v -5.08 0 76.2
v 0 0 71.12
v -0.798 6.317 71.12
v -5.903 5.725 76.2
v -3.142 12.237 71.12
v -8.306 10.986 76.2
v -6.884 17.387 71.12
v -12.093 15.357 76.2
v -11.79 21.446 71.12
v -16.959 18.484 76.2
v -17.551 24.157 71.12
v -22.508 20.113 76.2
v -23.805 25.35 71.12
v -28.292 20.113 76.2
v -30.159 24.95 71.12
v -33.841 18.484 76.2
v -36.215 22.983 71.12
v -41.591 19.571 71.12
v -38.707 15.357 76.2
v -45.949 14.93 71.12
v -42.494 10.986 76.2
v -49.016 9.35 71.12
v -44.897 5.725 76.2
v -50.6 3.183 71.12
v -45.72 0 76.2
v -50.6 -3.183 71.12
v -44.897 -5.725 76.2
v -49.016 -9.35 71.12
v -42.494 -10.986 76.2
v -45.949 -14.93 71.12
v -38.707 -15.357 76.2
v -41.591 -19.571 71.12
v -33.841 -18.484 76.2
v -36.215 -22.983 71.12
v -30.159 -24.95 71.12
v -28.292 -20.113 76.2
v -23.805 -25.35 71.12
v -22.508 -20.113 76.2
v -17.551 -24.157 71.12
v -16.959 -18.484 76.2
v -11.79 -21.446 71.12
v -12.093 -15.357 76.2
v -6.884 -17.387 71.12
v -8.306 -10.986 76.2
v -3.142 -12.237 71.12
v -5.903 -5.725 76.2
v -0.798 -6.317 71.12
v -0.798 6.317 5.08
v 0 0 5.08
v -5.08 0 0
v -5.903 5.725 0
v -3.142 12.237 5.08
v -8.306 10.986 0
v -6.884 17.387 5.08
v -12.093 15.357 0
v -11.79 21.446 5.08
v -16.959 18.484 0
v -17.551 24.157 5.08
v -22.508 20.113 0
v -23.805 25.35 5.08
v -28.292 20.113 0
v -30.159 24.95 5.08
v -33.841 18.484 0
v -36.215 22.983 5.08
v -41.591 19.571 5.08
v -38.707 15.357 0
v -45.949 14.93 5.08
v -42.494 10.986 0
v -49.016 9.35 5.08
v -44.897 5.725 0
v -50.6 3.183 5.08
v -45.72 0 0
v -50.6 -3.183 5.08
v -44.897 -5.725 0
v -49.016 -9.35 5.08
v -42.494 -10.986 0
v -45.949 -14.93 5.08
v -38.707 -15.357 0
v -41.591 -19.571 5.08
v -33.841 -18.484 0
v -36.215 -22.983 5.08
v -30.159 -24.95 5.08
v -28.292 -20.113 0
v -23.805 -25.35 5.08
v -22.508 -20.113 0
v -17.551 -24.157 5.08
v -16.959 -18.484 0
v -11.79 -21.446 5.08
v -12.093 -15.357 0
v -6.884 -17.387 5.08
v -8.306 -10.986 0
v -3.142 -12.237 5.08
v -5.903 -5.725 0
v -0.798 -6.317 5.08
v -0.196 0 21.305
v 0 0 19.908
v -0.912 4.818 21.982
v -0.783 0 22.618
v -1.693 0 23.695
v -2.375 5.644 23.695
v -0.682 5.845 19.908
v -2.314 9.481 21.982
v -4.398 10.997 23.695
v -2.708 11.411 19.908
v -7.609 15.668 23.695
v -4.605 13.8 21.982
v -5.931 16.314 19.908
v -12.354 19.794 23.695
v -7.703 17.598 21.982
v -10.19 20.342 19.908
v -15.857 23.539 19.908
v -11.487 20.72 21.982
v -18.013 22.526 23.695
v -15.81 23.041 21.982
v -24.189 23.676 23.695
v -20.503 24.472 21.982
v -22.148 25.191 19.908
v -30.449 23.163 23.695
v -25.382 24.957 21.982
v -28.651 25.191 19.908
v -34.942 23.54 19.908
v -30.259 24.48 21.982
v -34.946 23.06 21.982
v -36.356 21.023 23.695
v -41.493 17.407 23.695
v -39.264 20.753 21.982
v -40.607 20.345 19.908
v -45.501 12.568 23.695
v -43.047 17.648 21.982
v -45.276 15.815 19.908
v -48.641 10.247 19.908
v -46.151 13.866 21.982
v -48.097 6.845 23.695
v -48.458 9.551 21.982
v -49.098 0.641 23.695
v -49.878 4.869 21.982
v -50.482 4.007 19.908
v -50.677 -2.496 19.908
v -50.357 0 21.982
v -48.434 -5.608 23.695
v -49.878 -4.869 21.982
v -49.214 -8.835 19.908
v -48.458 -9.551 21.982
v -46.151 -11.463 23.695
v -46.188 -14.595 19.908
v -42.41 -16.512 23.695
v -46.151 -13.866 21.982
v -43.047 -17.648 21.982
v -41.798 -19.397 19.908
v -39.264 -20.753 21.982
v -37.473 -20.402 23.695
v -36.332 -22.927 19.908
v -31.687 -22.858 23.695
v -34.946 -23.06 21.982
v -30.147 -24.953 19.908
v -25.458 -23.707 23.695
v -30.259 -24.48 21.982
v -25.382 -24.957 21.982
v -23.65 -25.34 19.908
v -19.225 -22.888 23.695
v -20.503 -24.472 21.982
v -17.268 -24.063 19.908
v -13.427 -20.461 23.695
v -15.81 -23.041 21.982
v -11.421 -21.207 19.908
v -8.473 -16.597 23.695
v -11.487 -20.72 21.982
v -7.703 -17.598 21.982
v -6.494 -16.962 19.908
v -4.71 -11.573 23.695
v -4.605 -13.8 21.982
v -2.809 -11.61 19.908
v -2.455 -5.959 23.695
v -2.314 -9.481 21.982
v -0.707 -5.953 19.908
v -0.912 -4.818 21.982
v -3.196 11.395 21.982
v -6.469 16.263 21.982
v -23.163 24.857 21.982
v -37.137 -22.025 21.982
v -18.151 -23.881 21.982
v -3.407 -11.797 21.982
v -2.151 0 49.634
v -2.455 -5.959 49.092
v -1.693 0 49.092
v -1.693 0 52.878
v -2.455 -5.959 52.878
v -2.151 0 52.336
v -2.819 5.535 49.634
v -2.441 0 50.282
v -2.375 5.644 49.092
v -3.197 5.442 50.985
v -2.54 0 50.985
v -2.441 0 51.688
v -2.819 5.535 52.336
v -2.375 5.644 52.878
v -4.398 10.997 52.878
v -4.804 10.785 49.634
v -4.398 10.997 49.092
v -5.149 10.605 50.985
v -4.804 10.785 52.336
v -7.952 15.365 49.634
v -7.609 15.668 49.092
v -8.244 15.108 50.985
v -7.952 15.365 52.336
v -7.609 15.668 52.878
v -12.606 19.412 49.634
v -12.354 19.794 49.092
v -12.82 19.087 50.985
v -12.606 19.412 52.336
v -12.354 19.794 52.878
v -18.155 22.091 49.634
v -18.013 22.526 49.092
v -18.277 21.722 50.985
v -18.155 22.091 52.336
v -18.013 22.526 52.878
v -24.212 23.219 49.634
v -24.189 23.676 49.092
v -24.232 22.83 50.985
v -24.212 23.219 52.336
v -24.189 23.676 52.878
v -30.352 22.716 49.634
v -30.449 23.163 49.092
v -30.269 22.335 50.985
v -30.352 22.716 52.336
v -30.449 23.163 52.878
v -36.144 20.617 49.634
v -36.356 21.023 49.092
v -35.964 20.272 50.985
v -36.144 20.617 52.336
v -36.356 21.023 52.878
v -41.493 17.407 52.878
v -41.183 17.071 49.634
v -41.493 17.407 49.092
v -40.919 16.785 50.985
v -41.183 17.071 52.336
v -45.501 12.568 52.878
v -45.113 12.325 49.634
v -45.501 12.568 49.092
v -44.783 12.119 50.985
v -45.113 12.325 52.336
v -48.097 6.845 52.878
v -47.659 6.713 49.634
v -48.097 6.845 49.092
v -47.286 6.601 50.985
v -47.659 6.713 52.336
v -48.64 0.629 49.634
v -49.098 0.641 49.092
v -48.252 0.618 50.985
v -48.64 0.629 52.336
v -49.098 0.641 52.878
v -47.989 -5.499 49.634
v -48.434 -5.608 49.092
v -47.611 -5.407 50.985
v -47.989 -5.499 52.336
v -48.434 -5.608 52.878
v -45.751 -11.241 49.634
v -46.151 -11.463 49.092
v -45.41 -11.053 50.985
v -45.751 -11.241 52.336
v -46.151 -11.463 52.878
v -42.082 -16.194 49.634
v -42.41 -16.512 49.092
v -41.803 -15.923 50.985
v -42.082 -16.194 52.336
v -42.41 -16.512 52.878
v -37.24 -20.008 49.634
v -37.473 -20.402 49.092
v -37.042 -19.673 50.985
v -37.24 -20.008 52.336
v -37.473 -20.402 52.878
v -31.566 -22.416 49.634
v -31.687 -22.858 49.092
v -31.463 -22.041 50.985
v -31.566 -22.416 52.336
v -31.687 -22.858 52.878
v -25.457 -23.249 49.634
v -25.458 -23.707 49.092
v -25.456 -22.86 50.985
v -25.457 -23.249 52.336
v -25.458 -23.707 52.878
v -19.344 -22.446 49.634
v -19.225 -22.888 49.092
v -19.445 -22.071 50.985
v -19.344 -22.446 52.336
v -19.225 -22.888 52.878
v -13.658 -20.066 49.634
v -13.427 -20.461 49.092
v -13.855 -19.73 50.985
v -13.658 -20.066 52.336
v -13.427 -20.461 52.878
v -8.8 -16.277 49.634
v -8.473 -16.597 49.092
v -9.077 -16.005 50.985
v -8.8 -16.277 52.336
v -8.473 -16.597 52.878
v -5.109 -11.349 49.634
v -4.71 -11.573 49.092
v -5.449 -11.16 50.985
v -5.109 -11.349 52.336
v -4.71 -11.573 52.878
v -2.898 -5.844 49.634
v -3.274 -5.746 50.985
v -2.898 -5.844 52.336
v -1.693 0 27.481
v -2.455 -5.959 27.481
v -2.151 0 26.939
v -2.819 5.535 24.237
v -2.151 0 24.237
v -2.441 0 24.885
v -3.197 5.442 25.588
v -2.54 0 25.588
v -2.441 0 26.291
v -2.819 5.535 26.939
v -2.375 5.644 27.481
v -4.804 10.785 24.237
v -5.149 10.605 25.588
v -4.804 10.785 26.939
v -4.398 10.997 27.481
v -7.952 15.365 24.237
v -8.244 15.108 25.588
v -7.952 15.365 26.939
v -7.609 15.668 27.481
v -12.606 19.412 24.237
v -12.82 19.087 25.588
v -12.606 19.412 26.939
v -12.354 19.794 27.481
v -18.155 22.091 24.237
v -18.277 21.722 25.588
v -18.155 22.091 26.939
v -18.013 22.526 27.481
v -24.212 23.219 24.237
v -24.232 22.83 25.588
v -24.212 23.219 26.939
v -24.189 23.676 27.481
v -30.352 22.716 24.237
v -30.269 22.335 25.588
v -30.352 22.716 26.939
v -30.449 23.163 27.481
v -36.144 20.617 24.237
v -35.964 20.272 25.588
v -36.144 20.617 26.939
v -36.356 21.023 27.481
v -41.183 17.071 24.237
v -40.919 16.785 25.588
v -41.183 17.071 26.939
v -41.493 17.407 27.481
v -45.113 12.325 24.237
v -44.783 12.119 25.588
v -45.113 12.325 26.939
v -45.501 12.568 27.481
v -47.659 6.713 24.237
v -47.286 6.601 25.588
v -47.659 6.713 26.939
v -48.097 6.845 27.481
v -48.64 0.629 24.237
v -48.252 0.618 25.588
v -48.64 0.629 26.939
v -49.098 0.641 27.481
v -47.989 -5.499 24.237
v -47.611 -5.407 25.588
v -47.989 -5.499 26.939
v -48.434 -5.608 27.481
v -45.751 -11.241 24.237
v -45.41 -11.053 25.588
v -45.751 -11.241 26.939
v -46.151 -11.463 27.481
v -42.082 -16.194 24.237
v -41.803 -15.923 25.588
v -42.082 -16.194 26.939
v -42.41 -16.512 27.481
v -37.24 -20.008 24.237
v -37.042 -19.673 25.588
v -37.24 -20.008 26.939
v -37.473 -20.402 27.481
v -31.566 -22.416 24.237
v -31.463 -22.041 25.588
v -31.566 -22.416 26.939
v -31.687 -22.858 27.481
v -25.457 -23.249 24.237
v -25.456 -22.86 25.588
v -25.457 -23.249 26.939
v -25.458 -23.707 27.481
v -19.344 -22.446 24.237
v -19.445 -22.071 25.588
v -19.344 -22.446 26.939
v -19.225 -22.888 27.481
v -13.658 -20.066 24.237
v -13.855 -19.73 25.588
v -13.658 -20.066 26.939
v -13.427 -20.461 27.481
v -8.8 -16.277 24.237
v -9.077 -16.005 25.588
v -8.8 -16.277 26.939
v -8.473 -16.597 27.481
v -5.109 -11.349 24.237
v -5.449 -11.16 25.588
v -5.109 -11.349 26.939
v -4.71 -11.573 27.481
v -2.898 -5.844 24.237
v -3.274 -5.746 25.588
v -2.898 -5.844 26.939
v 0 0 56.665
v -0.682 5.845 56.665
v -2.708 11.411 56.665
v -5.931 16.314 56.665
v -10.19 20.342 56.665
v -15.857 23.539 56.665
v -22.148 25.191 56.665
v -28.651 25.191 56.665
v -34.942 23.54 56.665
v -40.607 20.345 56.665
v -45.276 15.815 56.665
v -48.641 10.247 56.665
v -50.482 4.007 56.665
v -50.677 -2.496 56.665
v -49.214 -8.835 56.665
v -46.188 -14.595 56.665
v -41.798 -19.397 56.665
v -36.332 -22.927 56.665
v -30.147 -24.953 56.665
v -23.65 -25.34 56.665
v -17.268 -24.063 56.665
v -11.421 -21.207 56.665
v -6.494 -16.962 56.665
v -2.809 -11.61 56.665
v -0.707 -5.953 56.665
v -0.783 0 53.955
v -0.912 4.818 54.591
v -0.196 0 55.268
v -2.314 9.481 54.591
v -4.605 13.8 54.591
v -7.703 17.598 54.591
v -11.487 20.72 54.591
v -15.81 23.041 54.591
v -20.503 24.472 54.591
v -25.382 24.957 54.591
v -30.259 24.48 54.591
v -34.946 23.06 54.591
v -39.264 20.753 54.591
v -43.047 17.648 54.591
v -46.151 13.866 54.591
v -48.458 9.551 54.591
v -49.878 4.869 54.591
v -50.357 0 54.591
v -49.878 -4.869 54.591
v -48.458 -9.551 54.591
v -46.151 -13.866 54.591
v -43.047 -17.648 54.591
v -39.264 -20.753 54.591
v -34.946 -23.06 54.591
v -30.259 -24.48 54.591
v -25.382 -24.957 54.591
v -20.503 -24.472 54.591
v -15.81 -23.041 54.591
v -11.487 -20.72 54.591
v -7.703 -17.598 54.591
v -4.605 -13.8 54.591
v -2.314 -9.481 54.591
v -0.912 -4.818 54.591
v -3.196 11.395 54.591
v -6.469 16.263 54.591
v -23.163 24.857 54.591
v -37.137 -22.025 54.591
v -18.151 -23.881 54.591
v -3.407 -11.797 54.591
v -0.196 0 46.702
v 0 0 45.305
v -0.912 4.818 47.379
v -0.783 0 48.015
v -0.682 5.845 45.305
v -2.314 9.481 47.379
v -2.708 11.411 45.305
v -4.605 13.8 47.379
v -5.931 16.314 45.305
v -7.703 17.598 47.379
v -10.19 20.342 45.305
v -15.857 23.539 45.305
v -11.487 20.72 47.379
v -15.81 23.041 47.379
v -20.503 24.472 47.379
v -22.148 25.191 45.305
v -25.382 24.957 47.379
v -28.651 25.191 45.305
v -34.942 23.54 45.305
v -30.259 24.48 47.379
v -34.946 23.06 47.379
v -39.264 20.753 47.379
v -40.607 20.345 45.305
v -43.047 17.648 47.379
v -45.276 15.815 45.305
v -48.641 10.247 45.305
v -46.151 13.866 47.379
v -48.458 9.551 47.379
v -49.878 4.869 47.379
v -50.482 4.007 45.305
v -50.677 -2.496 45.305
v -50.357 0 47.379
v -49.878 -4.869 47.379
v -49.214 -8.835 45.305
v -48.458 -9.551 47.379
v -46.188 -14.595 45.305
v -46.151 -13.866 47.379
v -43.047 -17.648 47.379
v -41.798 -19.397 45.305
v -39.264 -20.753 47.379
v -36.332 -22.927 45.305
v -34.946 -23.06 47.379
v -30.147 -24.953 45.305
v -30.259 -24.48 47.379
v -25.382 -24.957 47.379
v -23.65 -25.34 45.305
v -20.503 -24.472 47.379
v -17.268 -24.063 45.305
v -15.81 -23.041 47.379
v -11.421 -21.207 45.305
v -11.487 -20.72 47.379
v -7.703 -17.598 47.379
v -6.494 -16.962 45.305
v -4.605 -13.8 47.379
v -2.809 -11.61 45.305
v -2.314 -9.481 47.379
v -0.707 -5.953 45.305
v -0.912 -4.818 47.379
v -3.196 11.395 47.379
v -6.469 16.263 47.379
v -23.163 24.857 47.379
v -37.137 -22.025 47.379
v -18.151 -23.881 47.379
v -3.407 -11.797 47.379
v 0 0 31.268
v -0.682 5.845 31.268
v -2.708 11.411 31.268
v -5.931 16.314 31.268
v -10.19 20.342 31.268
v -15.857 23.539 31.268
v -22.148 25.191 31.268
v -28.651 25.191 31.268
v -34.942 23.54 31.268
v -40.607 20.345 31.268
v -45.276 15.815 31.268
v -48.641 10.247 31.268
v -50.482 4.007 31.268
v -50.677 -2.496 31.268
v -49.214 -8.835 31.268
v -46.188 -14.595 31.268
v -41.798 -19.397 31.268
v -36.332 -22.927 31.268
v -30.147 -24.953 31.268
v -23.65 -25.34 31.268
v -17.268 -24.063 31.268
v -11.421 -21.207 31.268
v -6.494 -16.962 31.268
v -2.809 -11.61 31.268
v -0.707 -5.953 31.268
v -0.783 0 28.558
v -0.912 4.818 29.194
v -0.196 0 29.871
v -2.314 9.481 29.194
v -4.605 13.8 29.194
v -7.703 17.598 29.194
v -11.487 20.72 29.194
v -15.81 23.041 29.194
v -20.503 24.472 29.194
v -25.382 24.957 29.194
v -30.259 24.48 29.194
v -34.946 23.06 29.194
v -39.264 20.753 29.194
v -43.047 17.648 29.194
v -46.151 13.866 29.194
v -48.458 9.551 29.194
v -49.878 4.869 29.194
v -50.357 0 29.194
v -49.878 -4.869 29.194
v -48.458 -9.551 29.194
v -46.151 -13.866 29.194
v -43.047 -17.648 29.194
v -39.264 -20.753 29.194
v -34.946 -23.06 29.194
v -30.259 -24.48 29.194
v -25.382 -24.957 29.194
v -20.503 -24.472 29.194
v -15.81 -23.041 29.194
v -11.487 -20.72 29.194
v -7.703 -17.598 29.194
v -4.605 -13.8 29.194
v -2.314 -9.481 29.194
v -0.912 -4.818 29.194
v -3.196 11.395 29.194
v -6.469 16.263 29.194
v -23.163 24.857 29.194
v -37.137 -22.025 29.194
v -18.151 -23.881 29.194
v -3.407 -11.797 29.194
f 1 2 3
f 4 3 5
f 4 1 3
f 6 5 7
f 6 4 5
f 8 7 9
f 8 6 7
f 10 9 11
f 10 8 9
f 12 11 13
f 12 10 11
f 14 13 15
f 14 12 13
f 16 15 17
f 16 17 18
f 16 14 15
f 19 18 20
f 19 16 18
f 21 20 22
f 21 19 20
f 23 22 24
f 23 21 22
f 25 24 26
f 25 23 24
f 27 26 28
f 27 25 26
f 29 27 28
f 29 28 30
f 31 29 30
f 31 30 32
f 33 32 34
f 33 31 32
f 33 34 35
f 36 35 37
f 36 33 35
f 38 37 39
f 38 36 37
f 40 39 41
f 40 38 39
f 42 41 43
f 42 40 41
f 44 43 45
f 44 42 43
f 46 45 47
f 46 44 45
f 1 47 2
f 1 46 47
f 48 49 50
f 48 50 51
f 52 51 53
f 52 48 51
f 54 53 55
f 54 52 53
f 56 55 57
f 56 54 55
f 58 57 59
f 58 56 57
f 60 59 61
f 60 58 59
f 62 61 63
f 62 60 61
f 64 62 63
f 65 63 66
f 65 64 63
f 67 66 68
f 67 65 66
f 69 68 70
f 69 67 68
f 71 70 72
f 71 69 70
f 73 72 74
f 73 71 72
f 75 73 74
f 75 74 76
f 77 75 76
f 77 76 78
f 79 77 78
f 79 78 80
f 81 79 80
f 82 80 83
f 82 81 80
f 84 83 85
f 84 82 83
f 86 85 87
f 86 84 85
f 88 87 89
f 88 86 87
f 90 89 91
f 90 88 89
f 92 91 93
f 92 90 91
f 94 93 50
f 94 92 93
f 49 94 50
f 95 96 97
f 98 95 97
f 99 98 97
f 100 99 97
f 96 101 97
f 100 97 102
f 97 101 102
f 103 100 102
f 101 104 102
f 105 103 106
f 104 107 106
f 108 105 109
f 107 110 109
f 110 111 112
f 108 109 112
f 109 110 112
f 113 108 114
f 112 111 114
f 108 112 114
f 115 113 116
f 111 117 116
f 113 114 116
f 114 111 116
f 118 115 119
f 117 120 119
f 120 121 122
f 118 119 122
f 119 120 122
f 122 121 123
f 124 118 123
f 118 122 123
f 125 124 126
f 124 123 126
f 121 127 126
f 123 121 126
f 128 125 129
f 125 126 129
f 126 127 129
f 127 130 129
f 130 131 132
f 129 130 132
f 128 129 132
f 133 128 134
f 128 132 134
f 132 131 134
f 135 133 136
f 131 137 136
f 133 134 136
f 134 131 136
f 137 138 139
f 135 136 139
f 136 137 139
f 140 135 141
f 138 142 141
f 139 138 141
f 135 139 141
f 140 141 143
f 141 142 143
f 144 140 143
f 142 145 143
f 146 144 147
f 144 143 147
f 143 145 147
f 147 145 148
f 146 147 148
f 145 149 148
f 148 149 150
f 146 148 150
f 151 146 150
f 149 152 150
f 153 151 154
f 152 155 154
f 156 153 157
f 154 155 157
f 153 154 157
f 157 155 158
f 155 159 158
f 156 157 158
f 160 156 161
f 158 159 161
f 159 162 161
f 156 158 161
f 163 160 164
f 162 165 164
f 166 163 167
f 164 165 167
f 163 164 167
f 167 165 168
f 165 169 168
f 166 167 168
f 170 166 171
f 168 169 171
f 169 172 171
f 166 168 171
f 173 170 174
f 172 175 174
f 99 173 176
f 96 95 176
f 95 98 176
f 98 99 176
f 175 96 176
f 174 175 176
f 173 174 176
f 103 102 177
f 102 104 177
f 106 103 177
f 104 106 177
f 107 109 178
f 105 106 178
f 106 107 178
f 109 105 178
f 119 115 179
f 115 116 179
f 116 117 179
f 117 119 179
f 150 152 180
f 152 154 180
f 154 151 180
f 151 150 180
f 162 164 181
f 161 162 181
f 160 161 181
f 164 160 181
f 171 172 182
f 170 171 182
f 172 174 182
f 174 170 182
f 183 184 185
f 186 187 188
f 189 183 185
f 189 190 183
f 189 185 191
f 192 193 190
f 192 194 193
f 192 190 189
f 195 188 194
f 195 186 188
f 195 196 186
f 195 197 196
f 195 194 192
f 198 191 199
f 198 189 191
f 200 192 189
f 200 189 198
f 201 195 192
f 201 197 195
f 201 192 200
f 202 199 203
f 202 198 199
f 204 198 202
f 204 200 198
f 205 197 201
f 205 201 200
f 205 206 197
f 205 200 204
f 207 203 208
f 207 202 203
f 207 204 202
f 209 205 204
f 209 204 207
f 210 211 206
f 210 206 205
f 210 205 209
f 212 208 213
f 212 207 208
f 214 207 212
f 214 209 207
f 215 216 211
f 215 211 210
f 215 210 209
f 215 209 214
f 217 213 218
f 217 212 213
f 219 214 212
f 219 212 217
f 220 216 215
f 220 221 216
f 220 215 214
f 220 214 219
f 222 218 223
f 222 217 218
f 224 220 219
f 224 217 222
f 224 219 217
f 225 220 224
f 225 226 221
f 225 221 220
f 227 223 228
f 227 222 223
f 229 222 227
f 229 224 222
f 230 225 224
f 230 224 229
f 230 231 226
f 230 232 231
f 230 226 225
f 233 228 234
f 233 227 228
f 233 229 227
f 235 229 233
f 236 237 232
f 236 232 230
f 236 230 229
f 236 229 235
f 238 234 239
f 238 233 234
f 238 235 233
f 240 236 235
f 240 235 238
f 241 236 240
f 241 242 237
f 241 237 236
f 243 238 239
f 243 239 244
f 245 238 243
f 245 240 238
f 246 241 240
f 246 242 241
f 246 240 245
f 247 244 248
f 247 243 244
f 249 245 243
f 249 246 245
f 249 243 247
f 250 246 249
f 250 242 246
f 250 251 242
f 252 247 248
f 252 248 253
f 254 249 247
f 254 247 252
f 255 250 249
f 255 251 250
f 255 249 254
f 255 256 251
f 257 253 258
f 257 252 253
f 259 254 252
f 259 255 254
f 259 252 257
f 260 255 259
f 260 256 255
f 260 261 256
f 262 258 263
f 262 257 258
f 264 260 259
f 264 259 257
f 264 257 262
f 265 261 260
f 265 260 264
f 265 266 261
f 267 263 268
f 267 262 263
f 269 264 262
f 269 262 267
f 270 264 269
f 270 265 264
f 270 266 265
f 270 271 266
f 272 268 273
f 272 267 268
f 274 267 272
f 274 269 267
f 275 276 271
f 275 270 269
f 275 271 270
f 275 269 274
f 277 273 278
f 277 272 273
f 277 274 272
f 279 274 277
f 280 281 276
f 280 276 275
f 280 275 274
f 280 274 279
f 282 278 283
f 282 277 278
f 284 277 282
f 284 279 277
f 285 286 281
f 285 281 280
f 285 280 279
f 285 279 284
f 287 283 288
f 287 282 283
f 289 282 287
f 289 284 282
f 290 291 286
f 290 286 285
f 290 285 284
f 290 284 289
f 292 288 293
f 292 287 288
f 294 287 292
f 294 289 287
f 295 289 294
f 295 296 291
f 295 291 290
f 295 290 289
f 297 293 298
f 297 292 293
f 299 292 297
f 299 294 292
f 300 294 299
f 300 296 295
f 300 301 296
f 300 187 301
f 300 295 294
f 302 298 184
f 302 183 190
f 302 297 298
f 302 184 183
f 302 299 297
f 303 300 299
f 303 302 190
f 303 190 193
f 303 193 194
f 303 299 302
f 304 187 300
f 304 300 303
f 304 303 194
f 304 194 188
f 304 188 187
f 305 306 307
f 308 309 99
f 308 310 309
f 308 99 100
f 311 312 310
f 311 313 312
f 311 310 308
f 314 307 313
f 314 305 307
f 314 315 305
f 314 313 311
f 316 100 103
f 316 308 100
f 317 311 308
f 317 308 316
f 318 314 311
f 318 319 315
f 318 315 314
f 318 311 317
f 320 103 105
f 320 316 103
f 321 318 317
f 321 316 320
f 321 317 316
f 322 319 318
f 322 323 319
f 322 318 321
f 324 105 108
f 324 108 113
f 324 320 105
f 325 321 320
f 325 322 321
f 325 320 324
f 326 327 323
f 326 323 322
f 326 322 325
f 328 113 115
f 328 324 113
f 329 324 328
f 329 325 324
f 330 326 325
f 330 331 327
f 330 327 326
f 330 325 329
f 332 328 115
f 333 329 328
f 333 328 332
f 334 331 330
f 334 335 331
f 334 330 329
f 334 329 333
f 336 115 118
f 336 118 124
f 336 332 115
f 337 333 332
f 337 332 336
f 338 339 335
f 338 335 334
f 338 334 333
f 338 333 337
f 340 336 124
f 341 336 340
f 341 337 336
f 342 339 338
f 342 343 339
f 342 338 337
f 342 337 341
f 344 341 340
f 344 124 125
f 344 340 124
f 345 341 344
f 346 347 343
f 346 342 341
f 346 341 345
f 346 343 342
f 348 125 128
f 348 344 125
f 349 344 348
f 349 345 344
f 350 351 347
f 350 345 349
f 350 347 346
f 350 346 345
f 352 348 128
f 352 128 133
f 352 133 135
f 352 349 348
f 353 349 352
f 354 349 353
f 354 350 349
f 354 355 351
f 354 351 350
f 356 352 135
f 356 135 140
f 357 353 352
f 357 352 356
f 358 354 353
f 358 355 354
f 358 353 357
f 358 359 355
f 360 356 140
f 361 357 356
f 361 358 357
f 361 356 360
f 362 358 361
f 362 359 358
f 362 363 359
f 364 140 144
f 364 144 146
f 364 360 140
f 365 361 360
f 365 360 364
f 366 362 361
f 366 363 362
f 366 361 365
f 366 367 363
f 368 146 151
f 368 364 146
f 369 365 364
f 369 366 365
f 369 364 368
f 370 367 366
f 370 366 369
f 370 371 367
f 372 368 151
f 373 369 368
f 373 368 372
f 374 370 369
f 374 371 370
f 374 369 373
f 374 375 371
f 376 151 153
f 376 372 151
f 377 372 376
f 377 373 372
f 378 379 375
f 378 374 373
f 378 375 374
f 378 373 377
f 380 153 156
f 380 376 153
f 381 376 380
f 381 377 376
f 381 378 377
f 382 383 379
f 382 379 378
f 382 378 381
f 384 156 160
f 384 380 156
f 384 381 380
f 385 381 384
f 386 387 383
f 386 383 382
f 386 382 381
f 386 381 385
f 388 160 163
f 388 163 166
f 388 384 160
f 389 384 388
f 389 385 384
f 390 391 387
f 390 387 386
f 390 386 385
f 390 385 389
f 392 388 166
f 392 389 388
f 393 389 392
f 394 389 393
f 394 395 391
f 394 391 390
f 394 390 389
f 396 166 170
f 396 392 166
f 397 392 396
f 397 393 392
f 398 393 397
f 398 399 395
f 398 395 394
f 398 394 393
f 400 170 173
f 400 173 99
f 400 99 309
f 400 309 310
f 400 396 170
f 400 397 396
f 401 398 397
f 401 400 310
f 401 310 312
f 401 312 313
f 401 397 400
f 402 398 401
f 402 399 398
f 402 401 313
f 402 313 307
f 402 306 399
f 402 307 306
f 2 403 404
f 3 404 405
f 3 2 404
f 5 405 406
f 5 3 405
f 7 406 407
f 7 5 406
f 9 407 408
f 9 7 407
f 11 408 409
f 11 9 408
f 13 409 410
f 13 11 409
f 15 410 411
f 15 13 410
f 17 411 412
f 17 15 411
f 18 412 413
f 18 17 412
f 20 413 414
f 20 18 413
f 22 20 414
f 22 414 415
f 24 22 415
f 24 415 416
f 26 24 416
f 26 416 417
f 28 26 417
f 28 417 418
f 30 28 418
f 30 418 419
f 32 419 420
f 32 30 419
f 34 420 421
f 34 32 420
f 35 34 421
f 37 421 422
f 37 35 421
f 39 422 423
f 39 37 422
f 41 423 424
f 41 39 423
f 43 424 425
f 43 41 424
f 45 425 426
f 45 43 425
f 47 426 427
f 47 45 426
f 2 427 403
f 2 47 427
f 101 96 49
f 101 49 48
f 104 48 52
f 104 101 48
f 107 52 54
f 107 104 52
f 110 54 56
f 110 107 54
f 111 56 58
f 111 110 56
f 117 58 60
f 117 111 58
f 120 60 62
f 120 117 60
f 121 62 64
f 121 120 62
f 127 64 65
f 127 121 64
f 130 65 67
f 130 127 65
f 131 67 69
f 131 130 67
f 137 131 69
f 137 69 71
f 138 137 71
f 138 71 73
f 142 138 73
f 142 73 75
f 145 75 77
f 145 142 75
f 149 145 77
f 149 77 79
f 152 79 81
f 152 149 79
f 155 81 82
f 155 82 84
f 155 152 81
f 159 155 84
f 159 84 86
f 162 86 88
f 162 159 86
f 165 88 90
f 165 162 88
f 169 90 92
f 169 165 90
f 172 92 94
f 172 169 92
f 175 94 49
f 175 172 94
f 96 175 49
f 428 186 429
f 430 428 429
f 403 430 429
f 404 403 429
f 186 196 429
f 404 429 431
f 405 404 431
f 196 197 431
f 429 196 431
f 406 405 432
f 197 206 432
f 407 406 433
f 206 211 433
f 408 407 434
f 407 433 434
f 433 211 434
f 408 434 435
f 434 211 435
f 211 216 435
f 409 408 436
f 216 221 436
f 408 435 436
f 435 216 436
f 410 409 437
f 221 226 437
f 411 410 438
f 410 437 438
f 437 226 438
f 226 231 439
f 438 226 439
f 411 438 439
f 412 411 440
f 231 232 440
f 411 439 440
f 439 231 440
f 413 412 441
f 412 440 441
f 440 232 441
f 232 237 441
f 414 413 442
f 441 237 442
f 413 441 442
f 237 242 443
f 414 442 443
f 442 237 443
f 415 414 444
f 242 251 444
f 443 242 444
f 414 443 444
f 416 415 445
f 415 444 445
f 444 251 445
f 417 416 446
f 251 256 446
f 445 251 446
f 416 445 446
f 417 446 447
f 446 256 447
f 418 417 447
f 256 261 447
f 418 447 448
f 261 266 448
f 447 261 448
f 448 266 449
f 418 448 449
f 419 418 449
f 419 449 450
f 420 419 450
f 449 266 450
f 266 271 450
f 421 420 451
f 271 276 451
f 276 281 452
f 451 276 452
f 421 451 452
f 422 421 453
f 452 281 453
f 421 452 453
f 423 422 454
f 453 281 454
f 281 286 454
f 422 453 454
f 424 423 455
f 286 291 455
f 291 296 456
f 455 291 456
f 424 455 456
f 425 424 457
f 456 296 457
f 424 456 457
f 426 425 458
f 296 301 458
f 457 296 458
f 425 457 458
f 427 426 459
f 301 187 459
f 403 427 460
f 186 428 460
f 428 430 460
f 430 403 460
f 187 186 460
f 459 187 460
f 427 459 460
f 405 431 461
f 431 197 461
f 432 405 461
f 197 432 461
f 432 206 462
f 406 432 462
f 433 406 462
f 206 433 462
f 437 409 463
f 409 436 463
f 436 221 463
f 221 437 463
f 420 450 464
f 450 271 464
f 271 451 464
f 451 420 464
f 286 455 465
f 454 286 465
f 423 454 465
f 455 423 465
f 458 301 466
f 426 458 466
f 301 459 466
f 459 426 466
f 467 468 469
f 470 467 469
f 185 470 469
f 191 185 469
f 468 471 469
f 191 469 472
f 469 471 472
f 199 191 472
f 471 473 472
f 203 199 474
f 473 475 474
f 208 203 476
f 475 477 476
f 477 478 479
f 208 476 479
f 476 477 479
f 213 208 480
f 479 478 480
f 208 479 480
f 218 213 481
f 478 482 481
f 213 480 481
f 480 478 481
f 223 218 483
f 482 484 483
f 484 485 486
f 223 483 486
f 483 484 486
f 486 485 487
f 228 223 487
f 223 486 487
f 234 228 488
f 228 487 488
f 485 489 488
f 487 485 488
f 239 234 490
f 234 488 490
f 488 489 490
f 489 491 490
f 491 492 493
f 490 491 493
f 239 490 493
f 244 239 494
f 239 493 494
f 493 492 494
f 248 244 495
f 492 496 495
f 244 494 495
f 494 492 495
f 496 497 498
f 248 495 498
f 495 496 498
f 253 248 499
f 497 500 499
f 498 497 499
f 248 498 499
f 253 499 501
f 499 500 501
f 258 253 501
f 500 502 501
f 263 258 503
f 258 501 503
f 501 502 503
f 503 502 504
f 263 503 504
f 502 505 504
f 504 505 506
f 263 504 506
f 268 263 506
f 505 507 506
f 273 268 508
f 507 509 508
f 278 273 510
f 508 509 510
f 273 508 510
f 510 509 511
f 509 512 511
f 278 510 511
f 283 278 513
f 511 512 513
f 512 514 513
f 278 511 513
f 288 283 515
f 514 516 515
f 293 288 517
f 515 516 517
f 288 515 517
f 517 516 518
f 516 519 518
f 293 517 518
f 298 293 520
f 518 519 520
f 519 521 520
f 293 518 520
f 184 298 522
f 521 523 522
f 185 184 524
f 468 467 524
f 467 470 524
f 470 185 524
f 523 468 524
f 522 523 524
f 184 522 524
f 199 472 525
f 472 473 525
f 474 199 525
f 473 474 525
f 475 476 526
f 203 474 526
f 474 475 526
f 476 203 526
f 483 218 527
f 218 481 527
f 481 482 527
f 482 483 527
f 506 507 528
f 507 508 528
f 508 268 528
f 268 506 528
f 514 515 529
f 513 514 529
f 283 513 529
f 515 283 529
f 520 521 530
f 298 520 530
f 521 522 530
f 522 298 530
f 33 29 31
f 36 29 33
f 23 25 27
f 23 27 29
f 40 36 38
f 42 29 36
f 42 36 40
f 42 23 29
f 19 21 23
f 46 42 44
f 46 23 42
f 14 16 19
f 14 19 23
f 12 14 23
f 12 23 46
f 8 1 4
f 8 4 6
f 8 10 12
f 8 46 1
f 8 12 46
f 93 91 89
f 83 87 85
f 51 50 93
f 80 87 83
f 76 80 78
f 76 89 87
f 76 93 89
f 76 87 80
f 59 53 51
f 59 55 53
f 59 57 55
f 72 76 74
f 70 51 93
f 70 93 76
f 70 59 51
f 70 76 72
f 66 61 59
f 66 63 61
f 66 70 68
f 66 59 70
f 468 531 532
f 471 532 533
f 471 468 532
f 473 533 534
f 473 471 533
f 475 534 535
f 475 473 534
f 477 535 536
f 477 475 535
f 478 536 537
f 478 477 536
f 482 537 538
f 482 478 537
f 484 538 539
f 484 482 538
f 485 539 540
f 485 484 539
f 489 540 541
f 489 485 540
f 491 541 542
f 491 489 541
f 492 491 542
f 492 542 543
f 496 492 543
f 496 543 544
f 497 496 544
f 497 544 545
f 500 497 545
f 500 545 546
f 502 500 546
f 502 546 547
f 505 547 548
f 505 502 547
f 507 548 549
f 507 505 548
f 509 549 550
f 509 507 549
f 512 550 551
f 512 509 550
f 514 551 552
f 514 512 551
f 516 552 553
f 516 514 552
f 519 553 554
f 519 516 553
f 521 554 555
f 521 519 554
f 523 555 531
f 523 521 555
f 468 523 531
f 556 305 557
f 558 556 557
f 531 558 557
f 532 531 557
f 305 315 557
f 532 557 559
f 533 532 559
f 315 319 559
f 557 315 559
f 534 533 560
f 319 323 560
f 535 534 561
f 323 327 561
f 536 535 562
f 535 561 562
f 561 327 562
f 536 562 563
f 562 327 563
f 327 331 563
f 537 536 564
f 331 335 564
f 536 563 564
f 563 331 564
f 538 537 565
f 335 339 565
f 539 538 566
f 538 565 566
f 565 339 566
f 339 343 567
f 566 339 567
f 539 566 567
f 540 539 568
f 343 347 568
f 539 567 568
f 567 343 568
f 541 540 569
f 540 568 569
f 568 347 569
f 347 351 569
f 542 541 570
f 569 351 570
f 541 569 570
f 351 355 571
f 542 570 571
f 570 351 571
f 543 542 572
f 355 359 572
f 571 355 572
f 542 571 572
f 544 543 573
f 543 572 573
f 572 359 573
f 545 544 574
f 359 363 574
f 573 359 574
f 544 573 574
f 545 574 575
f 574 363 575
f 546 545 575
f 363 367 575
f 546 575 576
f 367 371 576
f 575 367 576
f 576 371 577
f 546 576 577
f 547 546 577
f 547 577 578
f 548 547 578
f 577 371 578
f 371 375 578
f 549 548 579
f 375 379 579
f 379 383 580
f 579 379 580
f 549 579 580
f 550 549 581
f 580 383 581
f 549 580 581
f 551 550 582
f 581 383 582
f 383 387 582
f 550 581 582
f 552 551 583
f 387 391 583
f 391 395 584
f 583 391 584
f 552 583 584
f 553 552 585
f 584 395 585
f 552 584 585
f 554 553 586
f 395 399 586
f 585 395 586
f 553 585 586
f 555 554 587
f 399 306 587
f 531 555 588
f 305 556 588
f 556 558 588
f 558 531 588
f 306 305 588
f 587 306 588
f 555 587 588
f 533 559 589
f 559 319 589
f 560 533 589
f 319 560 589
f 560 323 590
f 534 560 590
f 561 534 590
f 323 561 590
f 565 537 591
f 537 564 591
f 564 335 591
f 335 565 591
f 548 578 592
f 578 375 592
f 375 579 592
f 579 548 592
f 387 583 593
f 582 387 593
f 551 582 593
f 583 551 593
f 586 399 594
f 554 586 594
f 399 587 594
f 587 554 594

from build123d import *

# Parameters (mm, degrees)
F2_SIZE = 5.08
F3_R    = 5.08


with BuildPart() as f1:
    # F0 (on Front) → F1 (revolve)
    with BuildSketch(Plane.XZ):
        with BuildLine():
            Line((-25.4, 0), (0, 0))
            Line((0, 0), (0, 23.0479238248))
            ThreePointArc((0, 23.0479238248), (-2.54, 25.5879238248), (0, 28.1279238248))
            Line((0, 28.1279238248), (0, 48.4448967195))
            ThreePointArc((0, 48.4448967195), (-2.54, 50.9848967195), (0, 53.5248967195))
            Line((0, 53.5248967195), (0, 76.2))
            Line((0, 76.2), (-25.4, 76.2))
            Line((-25.4, 76.2), (-25.4, 0))
        make_face()
    revolve(axis=Axis((-25.4, 0, 38.1), (0, 0, 1)))

    # F2
    f2_edges = [f1.edges().sort_by_distance(p)[0] for p in [
        (-50.8, 0, 76.2),
        (-50.8, 0, 0),
    ]]
    chamfer(f2_edges, length=F2_SIZE)

    # F3
    f3_edges = [f1.edges().sort_by_distance(p)[0] for p in [
        (-50.8, 0, 53.524897),
        (-50.8, 0, 28.127924),
        (-50.8, 0, 23.047924),
        (-50.8, 0, 48.444897),
    ]]
    fillet(f3_edges, radius=F3_R)


solid = f1.part
